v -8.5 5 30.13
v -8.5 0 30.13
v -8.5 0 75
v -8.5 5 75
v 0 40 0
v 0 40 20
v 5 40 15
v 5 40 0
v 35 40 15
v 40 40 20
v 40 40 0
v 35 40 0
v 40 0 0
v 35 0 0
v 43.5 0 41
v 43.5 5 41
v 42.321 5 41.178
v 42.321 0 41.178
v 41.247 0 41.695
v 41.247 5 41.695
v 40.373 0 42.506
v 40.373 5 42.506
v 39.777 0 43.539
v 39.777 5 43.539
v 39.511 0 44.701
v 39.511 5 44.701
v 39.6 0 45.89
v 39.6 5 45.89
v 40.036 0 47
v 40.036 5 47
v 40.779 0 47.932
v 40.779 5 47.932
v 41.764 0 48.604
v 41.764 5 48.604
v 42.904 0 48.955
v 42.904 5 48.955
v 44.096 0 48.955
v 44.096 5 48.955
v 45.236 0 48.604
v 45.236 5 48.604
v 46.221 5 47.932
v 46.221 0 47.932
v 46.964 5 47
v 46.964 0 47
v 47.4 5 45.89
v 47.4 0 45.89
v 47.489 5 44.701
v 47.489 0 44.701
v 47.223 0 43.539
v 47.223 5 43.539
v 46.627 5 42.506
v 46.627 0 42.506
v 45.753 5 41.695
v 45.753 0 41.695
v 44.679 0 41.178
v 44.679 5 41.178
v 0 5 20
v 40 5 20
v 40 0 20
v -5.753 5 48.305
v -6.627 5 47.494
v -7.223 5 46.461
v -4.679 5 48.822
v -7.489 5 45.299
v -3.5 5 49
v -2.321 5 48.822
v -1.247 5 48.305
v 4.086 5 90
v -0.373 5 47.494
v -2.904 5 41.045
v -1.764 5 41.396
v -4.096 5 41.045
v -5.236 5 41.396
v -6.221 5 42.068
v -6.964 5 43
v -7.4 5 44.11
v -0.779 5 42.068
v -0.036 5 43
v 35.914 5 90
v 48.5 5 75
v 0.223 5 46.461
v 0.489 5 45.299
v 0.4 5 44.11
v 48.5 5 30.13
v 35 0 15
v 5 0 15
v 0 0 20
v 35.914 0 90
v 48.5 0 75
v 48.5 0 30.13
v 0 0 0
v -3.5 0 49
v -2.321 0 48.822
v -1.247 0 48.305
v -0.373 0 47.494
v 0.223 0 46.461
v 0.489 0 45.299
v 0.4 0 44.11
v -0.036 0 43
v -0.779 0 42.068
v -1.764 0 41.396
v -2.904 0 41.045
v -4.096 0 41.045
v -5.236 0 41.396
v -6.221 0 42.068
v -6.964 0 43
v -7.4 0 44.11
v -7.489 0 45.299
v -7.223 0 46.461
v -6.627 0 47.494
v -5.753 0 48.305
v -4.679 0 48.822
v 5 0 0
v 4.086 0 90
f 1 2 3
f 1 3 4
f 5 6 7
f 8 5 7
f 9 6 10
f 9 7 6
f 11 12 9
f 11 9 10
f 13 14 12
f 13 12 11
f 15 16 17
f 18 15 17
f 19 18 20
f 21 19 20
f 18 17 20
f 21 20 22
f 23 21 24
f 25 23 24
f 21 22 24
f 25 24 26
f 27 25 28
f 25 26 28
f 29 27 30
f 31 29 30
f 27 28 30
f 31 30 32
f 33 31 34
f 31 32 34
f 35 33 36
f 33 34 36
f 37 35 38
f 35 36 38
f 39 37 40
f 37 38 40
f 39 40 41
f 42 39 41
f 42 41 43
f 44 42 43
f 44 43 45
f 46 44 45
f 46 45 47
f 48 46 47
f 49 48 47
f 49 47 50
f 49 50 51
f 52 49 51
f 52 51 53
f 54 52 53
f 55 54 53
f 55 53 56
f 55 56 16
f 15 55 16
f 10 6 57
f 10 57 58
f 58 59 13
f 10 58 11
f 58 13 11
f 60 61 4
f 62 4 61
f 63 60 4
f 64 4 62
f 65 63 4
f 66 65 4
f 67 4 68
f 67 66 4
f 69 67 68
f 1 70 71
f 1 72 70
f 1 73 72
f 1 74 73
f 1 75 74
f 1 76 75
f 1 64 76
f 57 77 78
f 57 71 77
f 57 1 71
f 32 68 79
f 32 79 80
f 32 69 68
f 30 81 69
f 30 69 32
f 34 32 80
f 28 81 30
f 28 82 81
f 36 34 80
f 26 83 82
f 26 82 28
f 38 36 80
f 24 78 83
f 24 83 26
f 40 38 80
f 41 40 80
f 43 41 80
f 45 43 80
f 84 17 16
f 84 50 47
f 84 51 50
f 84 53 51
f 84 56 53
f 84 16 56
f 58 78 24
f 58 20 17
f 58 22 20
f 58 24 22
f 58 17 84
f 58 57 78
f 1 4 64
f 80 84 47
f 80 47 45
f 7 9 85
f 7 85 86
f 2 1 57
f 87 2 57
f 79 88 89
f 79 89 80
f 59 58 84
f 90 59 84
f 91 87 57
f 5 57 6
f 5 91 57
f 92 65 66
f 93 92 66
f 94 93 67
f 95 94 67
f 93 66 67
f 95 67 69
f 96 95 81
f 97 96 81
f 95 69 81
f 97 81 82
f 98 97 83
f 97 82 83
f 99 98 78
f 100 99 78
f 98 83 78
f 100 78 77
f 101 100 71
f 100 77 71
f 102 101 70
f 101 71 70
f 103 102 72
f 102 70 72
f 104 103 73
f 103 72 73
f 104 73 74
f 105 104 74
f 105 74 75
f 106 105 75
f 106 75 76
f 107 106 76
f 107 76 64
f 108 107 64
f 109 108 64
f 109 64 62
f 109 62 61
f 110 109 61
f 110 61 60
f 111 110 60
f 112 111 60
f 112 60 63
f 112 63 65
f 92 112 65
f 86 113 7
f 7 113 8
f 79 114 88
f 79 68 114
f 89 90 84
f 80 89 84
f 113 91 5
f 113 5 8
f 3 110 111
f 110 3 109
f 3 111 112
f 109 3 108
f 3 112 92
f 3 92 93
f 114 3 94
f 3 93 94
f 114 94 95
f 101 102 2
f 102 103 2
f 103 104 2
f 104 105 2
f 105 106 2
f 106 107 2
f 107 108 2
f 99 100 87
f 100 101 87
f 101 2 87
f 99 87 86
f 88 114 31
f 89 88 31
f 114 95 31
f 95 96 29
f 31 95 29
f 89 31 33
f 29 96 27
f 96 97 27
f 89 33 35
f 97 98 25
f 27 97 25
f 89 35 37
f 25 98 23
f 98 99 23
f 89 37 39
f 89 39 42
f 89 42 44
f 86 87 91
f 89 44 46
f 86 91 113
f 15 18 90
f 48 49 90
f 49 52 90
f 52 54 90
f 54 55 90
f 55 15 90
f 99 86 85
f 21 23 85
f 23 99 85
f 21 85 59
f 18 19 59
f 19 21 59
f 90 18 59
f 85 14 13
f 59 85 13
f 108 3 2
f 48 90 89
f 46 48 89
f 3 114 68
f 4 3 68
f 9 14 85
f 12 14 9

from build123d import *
from OCP.BRepFilletAPI import BRepFilletAPI_MakeChamfer

# Parameters (mm, degrees)
SKETCH1_W           = 40
SKETCH1_H           = 40
BOSS_EXTRUDE1_DEPTH = 20
SKETCH2_W           = 30
SKETCH2_H           = 40
CUT_EXTRUDE1_DEPTH  = 15
SKETCH3_W           = 57
SKETCH3_H           = 5
BOSS_EXTRUDE2_DEPTH = 70
DRAFT1_ANGLE        = 50
DRAFT2_ANGLE        = 50
CHAMFER1_SIZE       = 15
CHAMFER1_SIZE2      = 12.586494468
SKETCH6_R           = 4
CUT_EXTRUDE3_DEPTH  = 109.061325182


with BuildPart() as part:
    # Sketch1 → Boss-Extrude1 (new body)
    with BuildSketch(Plane.XY):
        with Locations((20, 20)):
            Rectangle(SKETCH1_W, SKETCH1_H)
    extrude(amount=BOSS_EXTRUDE1_DEPTH)

    # Sketch2 → Cut-Extrude1 (cut)
    with BuildSketch(Plane(origin=(0, 0, 0), x_dir=(-1, 0, 0), z_dir=(0, 0, -1))):
        with Locations((-20, 20)):
            Rectangle(SKETCH2_W, SKETCH2_H)
    extrude(amount=-CUT_EXTRUDE1_DEPTH, mode=Mode.SUBTRACT)

    # Sketch3 → Boss-Extrude2 (add)
    with BuildSketch(Plane.XY.offset(20)):
        with Locations((20, 2.5)):
            Rectangle(SKETCH3_W, SKETCH3_H)
    extrude(amount=BOSS_EXTRUDE2_DEPTH)

    # Draft1
    draft1_faces = [part.faces().sort_by_distance(p)[0] for p in [
        (-4.25, 2.5, 20),
    ]]
    draft(draft1_faces, Plane(origin=(0, 0, 20), x_dir=(0, 0, -1), z_dir=(-1, 0, 0)), DRAFT1_ANGLE)

    # Draft2
    draft2_faces = [part.faces().sort_by_distance(p)[0] for p in [
        (44.25, 2.5, 20),
    ]]
    draft(draft2_faces, Plane(origin=(40, 40, 20), x_dir=(0, 1, 0), z_dir=(1, 0, 0)), DRAFT2_ANGLE)

    # Chamfer1: one chamfer whose edges measure the first distance from different faces: ONE call of the kernel's chamfer builder (chamfer() names one face for all edges)
    chamfer1_edges_1 = [part.edges().sort_by_distance(p)[0] for p in [
        (-8.5, 2.5, 90),
    ]]
    chamfer1_side_1 = [part.faces().sort_by_distance(p)[0] for p in [
        (-8.5, 2.5, 60.064952769),
    ]]
    chamfer1_edges_2 = [part.edges().sort_by_distance(p)[0] for p in [
        (48.5, 2.5, 90),
    ]]
    chamfer1_side_2 = [part.faces().sort_by_distance(p)[0] for p in [
        (48.5, 2.5, 60.064952769),
    ]]
    chamfer1 = BRepFilletAPI_MakeChamfer(part.part.solid().wrapped)
    for e in chamfer1_edges_1:
        chamfer1.Add(CHAMFER1_SIZE, CHAMFER1_SIZE2, e.wrapped, chamfer1_side_1[0].wrapped)  # the first distance lies on this face
    for e in chamfer1_edges_2:
        chamfer1.Add(CHAMFER1_SIZE, CHAMFER1_SIZE2, e.wrapped, chamfer1_side_2[0].wrapped)  # the first distance lies on this face
    add(Compound.cast(chamfer1.Shape()), mode=Mode.REPLACE)

    # Sketch6 → Cut-Extrude3 (cut, through all)
    with BuildSketch(Plane(origin=(0, 5, 0), x_dir=(1, 0, 0), z_dir=(0, 1, 0))):
        with Locations(Location((-3.5, -45, 0), (0, 0, 270))):
            Circle(SKETCH6_R)
        with Locations(Location((43.5, -45, 0), (0, 0, 90))):
            Circle(SKETCH6_R)
    extrude(amount=-CUT_EXTRUDE3_DEPTH, mode=Mode.SUBTRACT)


solid = part.part
